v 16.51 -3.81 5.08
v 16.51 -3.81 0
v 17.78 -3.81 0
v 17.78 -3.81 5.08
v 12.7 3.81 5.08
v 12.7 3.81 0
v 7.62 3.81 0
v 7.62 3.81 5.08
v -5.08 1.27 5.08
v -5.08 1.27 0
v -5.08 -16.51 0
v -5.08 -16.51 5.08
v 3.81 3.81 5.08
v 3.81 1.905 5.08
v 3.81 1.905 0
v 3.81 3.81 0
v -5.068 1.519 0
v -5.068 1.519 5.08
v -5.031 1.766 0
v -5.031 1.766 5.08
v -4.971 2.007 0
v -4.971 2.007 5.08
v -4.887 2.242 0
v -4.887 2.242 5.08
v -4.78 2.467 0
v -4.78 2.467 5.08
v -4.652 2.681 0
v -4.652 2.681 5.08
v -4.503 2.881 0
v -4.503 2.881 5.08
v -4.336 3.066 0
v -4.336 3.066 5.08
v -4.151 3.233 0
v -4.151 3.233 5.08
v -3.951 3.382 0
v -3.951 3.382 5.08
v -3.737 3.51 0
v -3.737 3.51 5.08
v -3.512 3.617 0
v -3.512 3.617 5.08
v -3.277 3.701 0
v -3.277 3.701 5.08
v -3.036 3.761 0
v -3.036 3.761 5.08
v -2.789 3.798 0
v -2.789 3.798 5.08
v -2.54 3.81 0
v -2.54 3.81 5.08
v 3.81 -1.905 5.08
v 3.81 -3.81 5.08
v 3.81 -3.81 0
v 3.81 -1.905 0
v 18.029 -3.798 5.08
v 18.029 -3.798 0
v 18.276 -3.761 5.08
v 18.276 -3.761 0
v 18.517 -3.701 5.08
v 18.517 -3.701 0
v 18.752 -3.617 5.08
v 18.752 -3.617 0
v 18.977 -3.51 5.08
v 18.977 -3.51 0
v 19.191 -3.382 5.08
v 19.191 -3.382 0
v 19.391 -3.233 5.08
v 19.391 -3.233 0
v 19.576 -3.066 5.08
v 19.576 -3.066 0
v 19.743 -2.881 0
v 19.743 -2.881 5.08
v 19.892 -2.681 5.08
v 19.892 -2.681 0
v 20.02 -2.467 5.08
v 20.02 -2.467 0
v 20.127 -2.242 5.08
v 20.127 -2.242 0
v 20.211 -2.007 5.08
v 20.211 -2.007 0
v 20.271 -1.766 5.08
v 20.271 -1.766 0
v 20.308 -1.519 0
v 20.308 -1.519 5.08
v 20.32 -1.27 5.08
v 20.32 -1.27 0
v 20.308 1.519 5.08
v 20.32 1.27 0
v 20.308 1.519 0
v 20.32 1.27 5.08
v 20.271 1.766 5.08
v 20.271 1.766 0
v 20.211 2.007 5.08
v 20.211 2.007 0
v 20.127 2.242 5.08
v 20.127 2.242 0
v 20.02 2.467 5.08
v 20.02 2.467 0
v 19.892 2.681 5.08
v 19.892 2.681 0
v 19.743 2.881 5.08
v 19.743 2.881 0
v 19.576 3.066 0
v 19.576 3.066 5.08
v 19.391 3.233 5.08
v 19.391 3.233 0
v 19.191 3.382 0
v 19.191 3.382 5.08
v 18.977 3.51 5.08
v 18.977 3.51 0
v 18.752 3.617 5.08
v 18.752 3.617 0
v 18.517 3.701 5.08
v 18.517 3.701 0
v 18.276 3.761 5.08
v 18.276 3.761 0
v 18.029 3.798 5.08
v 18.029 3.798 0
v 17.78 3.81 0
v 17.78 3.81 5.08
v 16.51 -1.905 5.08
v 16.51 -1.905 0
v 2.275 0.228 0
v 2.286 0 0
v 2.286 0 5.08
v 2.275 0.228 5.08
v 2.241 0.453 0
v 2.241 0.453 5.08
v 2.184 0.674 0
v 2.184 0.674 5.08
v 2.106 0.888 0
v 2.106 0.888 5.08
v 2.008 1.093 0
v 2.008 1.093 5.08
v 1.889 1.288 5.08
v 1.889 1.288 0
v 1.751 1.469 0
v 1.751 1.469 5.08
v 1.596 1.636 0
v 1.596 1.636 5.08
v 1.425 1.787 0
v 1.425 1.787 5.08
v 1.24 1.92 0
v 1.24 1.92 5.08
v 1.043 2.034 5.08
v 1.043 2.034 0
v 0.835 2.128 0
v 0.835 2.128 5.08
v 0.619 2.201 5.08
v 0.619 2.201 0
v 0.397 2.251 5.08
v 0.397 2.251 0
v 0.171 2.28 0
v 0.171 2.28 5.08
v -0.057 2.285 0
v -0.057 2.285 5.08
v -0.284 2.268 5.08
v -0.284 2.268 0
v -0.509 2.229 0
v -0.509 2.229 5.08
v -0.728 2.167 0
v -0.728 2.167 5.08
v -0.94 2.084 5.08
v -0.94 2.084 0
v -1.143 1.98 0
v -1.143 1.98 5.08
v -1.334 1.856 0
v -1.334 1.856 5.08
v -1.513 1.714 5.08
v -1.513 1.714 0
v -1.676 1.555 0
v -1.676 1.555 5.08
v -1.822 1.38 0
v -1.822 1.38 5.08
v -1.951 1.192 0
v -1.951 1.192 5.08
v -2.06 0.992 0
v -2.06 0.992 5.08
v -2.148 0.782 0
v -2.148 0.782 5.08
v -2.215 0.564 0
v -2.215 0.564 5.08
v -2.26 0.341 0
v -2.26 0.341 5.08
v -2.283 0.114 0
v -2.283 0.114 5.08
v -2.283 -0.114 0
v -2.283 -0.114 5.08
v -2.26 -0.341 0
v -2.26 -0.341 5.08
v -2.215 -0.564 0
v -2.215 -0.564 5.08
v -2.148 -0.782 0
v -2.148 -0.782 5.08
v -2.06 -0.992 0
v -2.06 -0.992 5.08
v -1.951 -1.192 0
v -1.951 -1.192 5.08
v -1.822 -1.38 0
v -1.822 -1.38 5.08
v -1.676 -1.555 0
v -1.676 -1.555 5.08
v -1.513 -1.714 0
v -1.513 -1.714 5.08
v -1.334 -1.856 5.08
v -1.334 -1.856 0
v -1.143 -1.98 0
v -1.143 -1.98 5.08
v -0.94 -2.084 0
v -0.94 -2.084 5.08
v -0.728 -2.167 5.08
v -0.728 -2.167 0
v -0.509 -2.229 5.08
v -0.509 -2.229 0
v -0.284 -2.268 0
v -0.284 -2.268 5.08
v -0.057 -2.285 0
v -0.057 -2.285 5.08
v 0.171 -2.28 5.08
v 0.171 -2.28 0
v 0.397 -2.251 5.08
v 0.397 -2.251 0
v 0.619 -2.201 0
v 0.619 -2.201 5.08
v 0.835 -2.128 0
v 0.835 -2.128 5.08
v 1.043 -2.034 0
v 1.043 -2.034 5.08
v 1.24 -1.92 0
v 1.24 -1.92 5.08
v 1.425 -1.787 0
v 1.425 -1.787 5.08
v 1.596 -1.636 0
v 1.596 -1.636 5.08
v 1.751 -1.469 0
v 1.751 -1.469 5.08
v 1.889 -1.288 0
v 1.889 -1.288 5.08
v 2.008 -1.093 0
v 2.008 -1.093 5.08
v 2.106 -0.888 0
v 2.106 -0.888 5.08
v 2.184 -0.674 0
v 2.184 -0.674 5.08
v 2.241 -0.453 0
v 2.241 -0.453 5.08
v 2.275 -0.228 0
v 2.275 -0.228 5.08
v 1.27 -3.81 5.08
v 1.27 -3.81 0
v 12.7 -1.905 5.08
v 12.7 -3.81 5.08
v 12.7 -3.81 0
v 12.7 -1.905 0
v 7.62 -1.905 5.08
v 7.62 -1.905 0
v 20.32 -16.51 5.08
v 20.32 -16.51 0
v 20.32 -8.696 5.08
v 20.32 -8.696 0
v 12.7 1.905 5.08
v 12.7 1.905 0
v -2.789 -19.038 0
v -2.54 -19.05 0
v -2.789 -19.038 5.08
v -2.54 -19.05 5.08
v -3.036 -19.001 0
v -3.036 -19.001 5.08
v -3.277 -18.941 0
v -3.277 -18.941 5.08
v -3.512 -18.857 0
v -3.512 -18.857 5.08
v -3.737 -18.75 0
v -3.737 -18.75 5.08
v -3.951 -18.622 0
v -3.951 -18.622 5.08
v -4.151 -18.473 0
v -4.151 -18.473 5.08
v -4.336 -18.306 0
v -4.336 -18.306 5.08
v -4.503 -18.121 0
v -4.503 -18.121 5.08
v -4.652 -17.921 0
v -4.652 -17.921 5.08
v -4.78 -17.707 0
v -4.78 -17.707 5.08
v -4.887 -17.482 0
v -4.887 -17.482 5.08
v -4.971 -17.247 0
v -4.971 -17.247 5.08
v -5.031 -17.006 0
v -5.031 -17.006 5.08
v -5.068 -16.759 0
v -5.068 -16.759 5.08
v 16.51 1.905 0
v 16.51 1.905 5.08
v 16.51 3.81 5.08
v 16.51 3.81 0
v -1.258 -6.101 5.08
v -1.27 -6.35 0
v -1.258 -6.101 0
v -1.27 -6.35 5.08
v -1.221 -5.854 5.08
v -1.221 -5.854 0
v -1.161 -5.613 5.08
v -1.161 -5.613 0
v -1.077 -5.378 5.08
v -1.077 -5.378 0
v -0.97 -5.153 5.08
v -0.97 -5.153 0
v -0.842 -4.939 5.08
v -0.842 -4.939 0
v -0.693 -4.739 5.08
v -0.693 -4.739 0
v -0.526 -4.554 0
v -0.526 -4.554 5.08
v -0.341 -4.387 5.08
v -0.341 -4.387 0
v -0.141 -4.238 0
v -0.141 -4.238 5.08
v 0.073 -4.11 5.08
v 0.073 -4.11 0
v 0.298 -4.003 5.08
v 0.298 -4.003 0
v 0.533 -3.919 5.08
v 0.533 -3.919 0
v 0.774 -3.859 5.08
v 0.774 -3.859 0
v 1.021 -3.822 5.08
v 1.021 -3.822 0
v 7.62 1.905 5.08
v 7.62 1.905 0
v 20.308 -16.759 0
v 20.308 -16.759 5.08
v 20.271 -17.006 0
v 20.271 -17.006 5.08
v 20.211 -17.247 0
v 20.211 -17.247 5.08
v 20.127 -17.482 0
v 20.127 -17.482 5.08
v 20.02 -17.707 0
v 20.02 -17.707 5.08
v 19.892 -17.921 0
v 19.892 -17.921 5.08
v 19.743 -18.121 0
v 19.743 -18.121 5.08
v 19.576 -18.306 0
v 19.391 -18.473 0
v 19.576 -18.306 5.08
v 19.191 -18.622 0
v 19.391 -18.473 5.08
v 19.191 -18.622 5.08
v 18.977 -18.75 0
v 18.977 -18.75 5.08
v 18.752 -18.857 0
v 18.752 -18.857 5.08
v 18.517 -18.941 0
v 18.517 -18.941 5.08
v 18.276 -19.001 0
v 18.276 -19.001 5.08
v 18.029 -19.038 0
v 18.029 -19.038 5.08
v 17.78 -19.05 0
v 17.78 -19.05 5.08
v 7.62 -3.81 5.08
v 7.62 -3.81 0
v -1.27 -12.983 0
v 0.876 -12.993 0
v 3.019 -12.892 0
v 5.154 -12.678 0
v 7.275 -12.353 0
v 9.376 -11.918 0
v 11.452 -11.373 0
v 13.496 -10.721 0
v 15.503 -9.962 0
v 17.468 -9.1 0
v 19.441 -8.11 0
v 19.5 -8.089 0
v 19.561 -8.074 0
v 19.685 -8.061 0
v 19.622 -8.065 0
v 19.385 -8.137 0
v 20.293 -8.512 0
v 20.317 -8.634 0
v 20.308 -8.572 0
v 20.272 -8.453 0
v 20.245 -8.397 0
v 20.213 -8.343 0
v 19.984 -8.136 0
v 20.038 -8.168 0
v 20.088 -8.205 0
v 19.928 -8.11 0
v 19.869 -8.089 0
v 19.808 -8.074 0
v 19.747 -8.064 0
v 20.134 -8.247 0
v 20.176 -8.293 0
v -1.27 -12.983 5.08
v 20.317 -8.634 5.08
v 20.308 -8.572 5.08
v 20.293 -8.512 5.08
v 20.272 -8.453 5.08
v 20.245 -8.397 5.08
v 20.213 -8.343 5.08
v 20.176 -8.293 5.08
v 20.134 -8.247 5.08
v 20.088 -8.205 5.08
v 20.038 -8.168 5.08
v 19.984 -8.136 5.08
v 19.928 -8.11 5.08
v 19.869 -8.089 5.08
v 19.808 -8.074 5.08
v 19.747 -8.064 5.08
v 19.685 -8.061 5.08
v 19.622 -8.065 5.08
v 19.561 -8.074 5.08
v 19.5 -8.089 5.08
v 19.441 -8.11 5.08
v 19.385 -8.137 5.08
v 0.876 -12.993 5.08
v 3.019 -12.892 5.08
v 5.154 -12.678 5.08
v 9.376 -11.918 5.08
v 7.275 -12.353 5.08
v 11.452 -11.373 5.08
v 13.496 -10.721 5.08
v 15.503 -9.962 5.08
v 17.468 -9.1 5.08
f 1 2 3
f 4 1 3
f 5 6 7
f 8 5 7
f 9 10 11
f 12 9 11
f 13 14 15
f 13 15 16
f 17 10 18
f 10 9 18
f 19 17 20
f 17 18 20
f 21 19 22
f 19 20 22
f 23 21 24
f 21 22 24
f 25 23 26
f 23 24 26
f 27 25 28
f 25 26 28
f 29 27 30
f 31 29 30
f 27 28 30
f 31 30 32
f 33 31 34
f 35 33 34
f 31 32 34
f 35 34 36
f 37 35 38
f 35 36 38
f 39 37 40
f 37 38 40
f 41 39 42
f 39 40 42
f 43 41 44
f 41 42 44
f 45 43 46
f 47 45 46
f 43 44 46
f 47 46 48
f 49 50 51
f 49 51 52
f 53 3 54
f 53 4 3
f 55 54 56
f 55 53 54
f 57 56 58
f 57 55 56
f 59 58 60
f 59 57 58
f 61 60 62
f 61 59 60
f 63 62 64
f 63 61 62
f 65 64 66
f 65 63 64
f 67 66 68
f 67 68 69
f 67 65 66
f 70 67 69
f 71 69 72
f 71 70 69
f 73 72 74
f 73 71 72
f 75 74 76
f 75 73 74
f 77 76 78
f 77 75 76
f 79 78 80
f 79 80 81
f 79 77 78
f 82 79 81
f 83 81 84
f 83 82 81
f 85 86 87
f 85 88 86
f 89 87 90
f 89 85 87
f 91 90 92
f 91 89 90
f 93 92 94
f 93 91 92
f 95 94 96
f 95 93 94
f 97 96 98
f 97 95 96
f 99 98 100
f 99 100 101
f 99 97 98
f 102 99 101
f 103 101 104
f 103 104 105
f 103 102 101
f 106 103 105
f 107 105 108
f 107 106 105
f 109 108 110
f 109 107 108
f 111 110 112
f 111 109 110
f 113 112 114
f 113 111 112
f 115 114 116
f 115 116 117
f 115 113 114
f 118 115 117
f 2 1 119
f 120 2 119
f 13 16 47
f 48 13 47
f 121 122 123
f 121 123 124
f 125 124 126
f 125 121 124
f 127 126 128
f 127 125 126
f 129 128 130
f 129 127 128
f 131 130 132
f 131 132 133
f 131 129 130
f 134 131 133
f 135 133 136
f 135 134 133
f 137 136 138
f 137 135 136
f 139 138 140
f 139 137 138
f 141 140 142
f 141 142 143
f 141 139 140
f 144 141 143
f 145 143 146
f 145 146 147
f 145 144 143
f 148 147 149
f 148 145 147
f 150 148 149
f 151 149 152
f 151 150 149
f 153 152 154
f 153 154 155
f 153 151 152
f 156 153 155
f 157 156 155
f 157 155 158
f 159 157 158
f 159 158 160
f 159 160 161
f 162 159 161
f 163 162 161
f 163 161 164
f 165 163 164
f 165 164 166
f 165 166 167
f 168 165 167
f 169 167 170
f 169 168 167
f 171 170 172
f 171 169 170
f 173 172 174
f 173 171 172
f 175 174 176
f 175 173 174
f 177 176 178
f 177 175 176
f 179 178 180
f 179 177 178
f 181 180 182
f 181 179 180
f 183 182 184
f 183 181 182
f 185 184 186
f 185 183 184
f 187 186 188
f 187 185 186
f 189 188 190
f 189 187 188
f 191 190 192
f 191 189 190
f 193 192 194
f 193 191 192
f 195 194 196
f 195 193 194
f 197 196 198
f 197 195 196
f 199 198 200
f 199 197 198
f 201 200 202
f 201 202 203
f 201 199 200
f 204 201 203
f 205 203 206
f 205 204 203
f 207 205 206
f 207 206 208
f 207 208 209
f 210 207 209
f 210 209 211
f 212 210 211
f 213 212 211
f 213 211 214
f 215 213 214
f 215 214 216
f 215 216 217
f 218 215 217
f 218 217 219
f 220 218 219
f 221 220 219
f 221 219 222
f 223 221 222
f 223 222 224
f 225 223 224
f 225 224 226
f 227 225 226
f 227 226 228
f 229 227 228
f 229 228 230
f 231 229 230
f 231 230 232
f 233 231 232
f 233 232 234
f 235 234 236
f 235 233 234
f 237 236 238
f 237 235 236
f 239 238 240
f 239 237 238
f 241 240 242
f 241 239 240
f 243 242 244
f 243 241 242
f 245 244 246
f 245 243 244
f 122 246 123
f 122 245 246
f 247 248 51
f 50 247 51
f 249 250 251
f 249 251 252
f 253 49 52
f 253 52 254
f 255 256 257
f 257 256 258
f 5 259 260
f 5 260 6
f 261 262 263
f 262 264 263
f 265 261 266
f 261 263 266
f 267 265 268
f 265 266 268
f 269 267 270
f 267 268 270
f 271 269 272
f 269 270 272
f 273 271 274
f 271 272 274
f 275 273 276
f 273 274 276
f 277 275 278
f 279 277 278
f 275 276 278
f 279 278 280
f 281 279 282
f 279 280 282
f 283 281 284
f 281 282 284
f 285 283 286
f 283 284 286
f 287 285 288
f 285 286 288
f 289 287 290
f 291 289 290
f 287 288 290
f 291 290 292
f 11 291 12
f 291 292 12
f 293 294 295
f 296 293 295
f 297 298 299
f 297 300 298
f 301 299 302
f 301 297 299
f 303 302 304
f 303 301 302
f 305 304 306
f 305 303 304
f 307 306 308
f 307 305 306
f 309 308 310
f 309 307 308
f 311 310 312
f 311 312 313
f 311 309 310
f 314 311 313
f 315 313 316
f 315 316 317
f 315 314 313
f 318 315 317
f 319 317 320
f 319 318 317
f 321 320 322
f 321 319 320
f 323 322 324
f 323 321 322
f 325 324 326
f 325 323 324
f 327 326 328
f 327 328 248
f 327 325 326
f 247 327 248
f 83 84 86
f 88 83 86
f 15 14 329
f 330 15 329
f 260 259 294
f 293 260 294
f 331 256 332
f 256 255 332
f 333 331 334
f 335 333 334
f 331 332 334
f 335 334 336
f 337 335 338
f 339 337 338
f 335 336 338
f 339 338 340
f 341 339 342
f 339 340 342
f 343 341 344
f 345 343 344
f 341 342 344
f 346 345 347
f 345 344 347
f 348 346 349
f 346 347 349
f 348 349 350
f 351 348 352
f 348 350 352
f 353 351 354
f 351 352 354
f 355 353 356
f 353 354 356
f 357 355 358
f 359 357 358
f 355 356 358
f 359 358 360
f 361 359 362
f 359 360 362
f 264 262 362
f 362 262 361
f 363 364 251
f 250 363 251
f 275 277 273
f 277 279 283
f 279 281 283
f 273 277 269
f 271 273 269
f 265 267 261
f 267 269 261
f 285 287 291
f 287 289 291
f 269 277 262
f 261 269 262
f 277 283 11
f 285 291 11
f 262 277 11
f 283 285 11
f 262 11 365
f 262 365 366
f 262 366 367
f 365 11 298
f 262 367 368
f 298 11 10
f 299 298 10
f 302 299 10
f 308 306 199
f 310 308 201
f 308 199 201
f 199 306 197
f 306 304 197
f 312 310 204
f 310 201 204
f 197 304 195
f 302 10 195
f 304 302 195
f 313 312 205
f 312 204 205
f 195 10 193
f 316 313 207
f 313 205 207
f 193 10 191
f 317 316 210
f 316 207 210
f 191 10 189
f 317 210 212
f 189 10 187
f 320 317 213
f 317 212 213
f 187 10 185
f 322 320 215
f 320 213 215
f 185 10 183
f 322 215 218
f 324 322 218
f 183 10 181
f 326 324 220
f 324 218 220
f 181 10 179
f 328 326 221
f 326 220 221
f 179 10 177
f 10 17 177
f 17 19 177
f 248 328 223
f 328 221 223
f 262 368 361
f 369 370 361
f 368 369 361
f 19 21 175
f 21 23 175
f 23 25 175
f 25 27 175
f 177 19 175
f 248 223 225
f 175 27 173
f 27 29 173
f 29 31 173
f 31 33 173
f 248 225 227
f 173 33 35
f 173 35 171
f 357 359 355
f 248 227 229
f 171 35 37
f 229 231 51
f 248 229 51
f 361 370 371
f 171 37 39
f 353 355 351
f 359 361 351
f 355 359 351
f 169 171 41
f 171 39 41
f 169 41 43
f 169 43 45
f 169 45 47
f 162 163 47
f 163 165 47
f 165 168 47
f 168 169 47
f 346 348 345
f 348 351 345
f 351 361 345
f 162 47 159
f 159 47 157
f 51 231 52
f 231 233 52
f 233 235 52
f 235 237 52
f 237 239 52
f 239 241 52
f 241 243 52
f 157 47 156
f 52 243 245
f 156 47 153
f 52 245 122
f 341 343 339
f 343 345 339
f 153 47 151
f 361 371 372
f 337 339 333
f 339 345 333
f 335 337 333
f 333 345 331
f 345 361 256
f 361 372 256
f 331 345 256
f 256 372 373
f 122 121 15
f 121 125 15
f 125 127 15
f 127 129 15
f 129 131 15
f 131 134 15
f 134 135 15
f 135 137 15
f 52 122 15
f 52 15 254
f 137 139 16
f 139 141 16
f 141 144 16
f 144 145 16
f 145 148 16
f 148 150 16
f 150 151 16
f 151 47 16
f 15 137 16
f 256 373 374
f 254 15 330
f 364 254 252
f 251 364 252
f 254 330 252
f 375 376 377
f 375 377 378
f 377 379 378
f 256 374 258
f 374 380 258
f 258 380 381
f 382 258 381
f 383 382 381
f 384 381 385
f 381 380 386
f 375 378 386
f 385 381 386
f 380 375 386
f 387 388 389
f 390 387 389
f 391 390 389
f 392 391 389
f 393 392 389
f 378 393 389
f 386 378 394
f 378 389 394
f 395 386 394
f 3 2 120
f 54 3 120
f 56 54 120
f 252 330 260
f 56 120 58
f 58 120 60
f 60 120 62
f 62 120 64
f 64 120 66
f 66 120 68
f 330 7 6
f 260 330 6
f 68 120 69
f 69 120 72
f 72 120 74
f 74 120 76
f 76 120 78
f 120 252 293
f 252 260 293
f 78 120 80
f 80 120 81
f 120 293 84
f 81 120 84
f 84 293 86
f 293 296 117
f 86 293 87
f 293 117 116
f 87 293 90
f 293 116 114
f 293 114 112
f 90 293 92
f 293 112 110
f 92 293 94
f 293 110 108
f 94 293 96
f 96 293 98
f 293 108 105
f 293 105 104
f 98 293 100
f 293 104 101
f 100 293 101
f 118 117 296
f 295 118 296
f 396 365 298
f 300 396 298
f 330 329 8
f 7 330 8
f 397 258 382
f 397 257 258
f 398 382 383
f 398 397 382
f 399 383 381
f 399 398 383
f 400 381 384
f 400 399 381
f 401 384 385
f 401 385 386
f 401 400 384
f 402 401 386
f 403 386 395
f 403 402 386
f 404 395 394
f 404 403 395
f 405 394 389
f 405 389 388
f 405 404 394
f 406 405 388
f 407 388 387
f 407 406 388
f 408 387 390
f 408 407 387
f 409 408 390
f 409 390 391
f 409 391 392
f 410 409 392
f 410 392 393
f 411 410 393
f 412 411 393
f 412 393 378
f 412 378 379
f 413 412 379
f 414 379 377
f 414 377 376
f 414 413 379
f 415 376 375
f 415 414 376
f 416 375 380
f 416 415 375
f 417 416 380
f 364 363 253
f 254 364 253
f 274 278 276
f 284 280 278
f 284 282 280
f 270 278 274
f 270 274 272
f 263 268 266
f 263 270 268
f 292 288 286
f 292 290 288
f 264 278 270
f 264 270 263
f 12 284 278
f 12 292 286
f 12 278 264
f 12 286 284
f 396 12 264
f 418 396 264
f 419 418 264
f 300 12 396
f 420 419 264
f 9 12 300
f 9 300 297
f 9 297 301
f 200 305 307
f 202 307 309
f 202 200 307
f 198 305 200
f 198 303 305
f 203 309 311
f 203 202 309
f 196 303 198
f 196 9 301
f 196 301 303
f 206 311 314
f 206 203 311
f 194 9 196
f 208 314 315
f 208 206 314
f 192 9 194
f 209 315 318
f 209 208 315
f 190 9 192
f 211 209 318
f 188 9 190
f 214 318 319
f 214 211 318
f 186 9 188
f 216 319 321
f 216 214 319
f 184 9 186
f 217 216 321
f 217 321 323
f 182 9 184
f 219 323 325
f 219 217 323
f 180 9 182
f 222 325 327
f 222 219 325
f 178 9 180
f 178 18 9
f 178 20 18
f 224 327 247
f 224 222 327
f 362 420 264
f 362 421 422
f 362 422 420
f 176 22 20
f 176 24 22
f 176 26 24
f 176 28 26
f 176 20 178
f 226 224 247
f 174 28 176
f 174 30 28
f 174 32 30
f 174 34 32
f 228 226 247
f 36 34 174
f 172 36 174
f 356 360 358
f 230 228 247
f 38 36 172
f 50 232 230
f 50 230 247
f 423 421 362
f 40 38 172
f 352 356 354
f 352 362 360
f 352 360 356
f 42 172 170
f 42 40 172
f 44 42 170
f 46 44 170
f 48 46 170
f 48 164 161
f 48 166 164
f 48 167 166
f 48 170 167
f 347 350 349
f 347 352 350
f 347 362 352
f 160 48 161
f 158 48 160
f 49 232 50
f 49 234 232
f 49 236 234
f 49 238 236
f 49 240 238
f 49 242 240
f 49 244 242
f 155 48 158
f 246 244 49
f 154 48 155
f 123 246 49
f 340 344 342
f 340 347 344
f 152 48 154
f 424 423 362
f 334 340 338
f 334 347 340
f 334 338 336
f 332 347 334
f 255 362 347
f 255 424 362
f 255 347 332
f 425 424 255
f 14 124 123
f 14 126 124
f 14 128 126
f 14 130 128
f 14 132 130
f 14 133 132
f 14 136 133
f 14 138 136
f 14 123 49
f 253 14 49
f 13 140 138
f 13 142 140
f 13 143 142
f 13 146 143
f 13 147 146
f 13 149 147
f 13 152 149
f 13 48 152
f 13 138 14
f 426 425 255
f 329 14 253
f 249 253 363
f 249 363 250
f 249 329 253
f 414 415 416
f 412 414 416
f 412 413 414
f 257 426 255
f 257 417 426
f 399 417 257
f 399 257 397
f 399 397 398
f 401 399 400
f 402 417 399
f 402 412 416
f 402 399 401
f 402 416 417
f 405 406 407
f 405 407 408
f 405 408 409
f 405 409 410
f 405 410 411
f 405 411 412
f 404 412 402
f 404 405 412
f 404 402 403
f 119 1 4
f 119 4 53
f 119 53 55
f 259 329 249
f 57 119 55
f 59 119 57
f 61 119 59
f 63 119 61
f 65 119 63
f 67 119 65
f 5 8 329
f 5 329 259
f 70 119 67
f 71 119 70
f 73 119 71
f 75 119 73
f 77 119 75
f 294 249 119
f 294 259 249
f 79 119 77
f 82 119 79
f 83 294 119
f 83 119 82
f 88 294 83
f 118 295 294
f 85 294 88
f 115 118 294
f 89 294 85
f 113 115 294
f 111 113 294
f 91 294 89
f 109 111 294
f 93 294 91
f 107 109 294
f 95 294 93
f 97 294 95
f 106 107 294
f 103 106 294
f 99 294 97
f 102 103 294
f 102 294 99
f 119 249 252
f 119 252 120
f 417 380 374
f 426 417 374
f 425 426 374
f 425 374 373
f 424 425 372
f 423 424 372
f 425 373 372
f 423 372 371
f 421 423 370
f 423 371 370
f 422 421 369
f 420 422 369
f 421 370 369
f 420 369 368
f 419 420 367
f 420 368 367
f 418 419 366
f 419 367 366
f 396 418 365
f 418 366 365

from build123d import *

# Parameters (mm, degrees)
SKETCH2_R           = 2.286
BOSS_EXTRUDE1_DEPTH = 5.08
FILLET1_R           = 2.54
FILLET2_R           = 0.635
SKETCH3_W           = 3.81
SKETCH3_H           = 1.905
CUT_EXTRUDE1_DEPTH  = 6.08


with BuildPart() as part:
    # Sketch2 → Boss-Extrude1 (new body)
    with BuildSketch(Plane.XY):
        with BuildLine():
            ThreePointArc((20.32, -7.62), (9.895271997, -11.792143987), (-1.27, -12.983127033))
            Line((-1.27, -12.983127033), (-1.27, -3.81))
            Line((-1.27, -3.81), (20.32, -3.81))
            Line((20.32, -3.81), (20.32, 3.81))
            Line((20.32, 3.81), (-5.08, 3.81))
            Line((-5.08, 3.81), (-5.08, -19.05))
            Line((-5.08, -19.05), (20.32, -19.05))
            Line((20.32, -19.05), (20.32, -7.62))
        make_face()
        Circle(SKETCH2_R, mode=Mode.SUBTRACT)
    extrude(amount=BOSS_EXTRUDE1_DEPTH)

    # Fillet1
    fillet1_edges = [part.edges().sort_by_distance(p)[0] for p in [
        (-5.08, 3.81, 2.54),
        (20.32, 3.81, 2.54),
        (20.32, -3.81, 2.54),
        (-1.27, -3.81, 2.54),
        (20.32, -19.05, 2.54),
        (-5.08, -19.05, 2.54),
    ]]
    fillet(fillet1_edges, radius=FILLET1_R)

    # Fillet2
    fillet2_edges = [part.edges().sort_by_distance(p)[0] for p in [
        (20.32, -7.62, 2.54),
    ]]
    fillet(fillet2_edges, radius=FILLET2_R)

    # Sketch3 → Cut-Extrude1 (cut, through all)
    with BuildSketch(Plane.XY.offset(5.08)):
        with Locations((5.715, 2.8575)):
            Rectangle(SKETCH3_W, SKETCH3_H)
        with Locations((5.715, -2.8575)):
            Rectangle(SKETCH3_W, SKETCH3_H)
        with Locations((14.605, 2.8575)):
            Rectangle(SKETCH3_W, SKETCH3_H)
        with Locations((14.605, -2.8575)):
            Rectangle(SKETCH3_W, SKETCH3_H)
    extrude(amount=-CUT_EXTRUDE1_DEPTH, mode=Mode.SUBTRACT)


solid = part.part
